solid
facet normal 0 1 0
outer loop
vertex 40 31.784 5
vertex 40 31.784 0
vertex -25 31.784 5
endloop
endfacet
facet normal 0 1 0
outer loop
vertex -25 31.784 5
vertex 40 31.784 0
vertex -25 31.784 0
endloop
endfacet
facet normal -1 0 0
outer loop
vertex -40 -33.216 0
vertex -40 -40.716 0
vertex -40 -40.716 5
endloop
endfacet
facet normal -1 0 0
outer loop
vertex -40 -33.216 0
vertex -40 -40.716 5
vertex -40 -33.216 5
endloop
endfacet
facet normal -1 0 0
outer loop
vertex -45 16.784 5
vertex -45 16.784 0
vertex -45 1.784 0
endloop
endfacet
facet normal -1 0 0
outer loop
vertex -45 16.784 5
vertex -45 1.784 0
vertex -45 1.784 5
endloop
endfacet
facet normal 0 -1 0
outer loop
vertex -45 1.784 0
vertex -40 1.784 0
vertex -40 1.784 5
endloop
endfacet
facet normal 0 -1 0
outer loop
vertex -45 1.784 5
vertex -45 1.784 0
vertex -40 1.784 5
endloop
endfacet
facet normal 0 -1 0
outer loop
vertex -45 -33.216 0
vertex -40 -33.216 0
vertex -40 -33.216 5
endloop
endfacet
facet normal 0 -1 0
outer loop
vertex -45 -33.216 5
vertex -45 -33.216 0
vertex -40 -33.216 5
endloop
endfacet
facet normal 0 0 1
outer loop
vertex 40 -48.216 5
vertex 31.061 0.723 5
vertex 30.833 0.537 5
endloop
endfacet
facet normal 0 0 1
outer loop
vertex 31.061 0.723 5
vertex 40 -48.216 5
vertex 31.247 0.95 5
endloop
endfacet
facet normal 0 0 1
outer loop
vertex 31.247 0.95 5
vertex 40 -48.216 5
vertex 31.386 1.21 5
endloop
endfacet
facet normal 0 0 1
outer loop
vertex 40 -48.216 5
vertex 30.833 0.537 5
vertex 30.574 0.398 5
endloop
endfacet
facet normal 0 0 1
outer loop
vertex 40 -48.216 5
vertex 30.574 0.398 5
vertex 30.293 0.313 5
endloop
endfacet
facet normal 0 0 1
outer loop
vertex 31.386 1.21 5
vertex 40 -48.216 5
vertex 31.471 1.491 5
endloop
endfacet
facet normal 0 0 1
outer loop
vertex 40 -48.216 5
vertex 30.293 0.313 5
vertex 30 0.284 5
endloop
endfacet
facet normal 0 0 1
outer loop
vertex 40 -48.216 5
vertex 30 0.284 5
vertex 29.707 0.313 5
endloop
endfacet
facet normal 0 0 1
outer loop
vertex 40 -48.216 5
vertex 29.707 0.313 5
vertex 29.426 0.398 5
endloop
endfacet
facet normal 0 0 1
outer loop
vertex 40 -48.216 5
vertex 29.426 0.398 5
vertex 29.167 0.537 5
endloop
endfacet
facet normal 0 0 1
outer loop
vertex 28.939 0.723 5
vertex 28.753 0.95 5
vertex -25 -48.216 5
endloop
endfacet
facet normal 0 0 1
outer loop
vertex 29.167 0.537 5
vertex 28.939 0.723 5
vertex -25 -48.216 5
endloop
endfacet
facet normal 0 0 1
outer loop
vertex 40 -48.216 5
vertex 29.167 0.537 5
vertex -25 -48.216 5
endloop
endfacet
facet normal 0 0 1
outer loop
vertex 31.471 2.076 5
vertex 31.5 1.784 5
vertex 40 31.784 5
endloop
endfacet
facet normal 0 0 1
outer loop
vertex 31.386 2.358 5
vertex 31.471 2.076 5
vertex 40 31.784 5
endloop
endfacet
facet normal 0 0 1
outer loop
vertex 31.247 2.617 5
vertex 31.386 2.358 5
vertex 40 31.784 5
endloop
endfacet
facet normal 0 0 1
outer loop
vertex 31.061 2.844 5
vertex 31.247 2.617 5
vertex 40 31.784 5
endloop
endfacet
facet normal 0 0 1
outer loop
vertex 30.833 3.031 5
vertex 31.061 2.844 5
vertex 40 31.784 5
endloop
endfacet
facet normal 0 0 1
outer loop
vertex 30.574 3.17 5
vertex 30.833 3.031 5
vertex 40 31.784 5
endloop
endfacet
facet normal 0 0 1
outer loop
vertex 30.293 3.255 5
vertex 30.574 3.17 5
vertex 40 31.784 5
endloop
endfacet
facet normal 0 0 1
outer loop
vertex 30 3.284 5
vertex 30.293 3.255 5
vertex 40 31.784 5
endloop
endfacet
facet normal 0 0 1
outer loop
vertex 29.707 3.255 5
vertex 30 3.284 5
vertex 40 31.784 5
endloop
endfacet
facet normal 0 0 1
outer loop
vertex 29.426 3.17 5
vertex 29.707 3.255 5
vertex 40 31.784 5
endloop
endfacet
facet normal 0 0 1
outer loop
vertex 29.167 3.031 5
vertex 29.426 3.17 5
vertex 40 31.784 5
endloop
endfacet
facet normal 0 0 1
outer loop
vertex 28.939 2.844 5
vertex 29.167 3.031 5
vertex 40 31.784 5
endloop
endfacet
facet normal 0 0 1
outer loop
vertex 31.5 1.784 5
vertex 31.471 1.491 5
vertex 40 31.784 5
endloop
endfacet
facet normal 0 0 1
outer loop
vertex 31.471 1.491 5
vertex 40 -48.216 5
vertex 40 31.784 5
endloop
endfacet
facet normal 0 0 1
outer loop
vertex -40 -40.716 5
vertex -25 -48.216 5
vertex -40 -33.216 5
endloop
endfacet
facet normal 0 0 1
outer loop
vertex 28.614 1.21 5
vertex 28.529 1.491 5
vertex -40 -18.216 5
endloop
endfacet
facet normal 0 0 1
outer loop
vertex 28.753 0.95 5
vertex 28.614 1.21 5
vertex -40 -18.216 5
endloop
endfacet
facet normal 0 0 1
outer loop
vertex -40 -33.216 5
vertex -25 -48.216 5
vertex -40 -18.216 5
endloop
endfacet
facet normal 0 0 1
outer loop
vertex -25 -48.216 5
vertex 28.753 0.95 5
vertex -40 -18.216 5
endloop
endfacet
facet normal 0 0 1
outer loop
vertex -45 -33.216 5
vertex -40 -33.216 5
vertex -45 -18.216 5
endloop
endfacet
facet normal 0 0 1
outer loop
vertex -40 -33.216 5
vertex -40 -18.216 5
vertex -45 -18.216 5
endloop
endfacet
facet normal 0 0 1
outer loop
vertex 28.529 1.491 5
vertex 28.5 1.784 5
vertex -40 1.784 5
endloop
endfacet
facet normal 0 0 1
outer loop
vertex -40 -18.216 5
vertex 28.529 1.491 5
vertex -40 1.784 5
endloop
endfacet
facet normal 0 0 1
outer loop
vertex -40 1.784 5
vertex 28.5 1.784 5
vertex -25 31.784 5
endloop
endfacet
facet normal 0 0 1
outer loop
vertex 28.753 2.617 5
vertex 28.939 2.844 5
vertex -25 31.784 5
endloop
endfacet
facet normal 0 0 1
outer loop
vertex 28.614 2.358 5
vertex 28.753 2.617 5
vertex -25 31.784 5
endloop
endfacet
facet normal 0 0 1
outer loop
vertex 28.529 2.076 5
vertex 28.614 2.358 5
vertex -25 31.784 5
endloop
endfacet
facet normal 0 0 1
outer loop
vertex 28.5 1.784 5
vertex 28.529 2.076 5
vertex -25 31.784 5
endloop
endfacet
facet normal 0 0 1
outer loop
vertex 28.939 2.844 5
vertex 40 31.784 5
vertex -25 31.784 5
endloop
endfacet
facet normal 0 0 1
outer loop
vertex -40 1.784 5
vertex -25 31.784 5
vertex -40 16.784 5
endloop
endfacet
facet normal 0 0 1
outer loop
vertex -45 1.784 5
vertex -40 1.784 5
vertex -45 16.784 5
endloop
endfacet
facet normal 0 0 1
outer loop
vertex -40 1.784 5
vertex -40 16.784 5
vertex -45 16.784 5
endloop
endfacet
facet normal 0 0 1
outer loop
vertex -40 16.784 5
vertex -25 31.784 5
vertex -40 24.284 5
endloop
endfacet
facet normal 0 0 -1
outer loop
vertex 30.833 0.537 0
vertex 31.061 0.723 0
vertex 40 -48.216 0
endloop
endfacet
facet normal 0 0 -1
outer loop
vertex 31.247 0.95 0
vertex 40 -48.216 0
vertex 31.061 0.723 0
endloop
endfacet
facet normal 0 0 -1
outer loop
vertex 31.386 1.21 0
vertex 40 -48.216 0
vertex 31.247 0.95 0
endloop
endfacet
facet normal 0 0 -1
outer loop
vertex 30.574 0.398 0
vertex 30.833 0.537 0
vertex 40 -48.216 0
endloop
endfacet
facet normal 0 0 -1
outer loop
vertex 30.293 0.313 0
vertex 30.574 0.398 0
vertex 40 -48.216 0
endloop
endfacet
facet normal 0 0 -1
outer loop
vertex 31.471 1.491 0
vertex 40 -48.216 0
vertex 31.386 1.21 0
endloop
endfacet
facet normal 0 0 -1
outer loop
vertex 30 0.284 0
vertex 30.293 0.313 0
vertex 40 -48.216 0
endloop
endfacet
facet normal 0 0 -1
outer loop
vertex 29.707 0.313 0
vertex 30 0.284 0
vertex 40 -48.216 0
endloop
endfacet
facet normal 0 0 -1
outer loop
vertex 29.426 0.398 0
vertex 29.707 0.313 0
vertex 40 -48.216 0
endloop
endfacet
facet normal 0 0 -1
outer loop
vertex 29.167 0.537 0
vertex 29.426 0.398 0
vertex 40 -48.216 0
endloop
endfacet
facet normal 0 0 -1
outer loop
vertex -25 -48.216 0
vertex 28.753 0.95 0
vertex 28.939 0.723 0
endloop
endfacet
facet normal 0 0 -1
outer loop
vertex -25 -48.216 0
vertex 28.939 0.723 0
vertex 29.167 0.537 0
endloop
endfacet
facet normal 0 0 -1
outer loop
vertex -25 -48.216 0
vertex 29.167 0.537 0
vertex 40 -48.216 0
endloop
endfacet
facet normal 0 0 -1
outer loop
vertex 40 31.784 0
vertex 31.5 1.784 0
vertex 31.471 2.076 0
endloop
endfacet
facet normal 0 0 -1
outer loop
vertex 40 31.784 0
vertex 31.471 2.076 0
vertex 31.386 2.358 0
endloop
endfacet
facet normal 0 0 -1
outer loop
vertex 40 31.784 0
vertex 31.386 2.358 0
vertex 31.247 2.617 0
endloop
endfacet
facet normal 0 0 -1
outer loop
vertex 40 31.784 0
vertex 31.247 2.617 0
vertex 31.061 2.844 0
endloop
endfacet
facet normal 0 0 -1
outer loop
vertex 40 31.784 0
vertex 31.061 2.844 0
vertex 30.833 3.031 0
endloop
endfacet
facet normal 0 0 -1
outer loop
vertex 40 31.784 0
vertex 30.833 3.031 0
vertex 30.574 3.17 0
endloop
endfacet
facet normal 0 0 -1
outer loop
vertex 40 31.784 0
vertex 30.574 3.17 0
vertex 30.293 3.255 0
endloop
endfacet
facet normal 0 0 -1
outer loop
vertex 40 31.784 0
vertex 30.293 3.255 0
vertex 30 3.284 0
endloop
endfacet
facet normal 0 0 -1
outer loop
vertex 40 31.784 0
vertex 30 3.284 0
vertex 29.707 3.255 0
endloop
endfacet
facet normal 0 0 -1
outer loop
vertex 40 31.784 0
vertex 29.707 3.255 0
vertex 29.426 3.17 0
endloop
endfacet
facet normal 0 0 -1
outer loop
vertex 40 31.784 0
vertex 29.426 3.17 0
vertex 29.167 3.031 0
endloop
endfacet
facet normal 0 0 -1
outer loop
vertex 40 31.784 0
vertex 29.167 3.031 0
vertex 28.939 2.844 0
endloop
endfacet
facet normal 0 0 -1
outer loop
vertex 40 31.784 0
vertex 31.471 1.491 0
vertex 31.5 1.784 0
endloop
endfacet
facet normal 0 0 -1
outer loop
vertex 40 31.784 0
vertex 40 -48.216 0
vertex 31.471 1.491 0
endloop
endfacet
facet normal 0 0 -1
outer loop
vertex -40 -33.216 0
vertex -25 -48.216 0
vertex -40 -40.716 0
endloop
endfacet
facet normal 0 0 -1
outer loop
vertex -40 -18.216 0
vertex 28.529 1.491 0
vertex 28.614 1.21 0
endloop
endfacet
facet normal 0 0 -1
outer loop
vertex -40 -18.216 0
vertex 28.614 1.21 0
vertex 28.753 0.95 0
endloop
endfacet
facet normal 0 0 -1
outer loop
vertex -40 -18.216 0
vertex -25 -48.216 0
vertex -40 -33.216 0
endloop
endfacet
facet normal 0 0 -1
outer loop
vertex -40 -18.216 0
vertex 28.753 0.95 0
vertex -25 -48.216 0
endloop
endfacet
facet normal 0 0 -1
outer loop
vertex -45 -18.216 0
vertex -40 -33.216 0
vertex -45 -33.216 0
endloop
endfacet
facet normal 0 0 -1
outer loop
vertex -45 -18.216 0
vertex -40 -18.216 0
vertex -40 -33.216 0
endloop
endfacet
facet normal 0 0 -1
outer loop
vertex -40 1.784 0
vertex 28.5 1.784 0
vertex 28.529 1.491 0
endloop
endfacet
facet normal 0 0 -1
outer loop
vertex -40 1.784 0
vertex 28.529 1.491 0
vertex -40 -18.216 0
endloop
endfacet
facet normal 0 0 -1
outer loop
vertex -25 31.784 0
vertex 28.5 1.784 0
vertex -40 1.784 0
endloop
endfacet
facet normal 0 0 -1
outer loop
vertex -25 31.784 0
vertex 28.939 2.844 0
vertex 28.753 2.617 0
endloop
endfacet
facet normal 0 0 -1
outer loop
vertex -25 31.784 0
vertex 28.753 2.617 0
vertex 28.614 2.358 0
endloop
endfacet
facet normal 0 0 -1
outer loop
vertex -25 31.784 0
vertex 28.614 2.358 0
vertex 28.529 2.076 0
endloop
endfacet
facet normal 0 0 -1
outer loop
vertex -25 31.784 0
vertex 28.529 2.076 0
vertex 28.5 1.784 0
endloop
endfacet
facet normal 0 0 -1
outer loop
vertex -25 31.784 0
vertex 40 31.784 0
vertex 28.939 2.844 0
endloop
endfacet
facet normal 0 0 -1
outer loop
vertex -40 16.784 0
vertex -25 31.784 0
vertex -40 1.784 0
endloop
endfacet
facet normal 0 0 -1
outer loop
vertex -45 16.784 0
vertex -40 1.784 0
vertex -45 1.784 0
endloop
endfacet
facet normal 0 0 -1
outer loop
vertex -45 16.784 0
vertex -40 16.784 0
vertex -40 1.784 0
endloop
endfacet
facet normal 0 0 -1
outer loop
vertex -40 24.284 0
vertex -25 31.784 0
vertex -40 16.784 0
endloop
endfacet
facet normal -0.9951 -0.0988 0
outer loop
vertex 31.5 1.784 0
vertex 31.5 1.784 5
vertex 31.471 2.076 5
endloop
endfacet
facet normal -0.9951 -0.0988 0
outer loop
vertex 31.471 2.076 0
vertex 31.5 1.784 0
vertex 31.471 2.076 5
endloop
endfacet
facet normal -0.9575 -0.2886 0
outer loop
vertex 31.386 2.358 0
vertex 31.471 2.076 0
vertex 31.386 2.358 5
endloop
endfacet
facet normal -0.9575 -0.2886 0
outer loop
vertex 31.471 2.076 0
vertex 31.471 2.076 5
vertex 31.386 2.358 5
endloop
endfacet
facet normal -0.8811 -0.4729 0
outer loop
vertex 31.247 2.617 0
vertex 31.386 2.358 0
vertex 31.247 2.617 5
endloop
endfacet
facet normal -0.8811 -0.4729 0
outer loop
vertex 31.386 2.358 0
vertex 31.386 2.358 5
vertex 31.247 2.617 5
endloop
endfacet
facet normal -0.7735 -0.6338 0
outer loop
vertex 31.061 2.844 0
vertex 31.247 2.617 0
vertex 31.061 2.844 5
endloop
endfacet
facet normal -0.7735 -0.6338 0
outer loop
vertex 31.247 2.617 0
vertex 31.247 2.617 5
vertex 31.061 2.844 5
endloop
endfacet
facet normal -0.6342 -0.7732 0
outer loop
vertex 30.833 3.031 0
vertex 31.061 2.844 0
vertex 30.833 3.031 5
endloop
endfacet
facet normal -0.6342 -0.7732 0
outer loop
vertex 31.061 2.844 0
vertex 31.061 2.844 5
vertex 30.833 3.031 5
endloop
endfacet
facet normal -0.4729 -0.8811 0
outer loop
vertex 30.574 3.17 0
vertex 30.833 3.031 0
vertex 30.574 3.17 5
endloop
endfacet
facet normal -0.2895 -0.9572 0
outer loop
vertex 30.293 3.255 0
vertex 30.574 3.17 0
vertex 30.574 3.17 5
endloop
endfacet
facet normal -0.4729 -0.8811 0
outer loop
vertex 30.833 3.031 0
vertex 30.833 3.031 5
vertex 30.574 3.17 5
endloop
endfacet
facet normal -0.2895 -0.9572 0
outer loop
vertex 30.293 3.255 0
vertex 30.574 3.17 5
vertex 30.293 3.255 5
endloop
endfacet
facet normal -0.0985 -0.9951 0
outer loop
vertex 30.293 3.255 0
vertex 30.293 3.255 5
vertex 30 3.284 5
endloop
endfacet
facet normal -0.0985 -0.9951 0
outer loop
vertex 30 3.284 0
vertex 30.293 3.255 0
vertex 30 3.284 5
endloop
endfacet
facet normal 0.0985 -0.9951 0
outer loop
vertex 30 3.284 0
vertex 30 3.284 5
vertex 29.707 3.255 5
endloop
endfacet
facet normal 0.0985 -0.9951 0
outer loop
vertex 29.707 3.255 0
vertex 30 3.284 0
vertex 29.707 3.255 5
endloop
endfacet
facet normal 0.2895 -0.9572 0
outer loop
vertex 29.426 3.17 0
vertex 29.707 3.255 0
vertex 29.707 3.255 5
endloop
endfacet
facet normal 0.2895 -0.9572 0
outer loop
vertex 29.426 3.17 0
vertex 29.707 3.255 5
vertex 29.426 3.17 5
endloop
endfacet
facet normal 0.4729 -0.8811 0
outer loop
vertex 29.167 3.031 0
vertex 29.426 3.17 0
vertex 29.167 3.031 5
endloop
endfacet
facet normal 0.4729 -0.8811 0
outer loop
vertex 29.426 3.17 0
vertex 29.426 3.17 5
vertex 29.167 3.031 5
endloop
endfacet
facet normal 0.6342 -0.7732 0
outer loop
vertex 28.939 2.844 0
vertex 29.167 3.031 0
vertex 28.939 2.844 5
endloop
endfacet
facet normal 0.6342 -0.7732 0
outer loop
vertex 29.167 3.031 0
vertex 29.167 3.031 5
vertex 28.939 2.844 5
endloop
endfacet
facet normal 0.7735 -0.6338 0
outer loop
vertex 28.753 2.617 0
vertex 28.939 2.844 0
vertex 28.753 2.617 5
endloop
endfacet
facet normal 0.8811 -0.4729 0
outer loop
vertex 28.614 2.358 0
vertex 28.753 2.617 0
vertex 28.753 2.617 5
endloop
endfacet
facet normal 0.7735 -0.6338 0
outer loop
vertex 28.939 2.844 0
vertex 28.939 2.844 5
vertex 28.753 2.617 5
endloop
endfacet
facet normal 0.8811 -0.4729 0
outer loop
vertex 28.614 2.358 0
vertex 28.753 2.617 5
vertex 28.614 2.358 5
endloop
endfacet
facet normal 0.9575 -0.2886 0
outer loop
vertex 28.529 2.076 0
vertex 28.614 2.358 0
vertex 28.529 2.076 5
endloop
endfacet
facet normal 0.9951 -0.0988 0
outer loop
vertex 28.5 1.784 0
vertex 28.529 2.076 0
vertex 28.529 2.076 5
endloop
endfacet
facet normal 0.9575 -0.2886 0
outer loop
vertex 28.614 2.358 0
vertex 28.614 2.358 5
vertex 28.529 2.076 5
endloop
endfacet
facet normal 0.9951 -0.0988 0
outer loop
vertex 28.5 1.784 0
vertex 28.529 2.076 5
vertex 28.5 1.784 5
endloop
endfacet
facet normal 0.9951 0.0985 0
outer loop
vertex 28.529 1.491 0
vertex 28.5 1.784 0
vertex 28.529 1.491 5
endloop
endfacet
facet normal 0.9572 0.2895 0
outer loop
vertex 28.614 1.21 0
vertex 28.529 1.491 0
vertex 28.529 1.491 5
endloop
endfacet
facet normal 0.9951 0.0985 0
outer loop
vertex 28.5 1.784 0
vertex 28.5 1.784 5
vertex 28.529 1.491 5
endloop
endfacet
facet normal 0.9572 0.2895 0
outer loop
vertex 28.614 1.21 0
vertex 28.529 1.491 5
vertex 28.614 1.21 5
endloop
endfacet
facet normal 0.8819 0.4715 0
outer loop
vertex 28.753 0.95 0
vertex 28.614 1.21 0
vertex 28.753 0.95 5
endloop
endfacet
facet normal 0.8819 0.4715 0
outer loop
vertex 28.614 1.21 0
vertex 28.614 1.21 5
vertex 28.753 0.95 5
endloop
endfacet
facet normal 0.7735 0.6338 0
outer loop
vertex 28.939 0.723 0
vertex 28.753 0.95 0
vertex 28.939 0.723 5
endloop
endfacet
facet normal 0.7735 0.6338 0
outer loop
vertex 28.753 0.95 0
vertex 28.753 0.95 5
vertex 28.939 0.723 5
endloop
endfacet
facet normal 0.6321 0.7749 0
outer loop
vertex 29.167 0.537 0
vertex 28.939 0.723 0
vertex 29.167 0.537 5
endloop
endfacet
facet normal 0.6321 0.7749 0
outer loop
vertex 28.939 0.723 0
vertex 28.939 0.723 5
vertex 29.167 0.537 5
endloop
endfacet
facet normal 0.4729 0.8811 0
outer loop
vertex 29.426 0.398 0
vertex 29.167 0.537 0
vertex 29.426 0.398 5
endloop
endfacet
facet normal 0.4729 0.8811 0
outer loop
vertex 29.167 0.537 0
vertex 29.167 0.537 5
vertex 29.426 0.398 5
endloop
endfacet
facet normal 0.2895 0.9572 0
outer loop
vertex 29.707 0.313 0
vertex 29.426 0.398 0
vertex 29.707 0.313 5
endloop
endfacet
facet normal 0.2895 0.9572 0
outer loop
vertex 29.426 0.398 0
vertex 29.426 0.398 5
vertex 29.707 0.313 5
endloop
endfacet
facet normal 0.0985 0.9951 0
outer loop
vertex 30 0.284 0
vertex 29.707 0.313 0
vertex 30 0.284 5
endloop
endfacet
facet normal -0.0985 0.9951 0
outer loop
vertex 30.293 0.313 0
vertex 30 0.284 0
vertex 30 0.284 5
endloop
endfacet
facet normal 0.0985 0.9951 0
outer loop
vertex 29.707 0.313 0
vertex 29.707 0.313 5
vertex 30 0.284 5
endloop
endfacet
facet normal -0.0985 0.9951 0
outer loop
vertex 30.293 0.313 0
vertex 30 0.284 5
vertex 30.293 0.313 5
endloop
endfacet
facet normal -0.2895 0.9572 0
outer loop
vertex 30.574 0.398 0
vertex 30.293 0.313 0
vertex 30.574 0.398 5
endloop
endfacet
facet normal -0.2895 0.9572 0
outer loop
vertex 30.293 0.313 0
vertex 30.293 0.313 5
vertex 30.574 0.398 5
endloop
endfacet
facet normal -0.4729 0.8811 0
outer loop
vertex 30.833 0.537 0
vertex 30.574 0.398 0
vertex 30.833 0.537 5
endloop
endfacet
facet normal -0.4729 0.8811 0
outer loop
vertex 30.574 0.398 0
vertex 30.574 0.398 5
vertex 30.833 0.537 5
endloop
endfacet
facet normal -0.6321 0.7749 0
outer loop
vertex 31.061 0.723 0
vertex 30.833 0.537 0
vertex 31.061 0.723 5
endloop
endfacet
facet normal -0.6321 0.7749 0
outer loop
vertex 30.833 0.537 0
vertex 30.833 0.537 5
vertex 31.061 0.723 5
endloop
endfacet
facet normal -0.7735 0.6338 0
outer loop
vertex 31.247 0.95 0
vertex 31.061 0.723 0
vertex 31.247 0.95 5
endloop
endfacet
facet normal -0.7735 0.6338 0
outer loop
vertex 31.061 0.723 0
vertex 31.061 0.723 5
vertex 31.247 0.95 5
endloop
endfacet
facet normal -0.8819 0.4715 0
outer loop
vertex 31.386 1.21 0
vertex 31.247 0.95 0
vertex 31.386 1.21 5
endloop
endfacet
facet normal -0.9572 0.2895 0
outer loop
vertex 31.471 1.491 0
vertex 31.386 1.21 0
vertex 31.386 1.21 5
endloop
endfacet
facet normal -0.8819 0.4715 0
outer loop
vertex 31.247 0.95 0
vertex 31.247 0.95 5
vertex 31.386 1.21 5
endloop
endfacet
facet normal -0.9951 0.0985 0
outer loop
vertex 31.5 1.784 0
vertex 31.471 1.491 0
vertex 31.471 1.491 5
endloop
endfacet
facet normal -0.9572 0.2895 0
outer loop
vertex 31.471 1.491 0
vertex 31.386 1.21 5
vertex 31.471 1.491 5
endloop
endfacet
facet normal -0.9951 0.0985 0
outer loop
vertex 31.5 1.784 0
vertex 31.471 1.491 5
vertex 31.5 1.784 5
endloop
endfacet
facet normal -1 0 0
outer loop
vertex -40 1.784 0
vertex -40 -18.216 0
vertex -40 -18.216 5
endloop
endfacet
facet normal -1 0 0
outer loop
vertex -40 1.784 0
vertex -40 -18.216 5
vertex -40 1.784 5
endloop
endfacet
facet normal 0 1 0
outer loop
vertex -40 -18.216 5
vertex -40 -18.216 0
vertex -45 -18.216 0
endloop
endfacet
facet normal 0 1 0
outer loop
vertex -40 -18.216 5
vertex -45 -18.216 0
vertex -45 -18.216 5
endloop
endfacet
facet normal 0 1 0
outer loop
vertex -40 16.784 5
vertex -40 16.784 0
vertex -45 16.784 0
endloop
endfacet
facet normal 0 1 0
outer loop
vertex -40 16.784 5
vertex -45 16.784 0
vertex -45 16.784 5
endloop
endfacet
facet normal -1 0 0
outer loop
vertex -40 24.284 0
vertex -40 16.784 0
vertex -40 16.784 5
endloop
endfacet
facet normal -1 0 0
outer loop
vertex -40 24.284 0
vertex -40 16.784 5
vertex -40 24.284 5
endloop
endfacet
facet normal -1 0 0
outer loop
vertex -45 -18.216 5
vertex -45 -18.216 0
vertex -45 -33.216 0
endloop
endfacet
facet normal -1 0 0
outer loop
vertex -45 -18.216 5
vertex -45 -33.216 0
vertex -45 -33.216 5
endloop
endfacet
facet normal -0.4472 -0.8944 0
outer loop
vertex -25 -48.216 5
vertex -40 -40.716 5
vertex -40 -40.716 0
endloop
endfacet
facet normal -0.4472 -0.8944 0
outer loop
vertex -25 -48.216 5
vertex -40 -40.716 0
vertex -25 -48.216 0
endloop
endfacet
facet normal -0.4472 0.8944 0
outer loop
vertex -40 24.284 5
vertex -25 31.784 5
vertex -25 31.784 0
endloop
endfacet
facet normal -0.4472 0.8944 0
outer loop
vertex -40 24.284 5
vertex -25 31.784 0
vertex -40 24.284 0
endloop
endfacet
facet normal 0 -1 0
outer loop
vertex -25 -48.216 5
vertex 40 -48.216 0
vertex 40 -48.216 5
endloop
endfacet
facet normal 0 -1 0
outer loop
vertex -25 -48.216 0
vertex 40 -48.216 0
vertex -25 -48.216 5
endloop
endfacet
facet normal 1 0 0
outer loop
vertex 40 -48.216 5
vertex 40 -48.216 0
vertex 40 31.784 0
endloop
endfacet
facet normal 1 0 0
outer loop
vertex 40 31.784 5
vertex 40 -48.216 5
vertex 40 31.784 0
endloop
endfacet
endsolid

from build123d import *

# Parameters (mm, degrees)
BOSS_EXTRUDE1_DEPTH = 5
SKETCH3_W           = 5
SKETCH3_H           = 15
BOSS_EXTRUDE2_DEPTH = 5
CUT_EXTRUDE2_DEPTH  = 5
SKETCH5_R           = 1.5
CUT_EXTRUDE3_DEPTH  = 5


with BuildPart() as part:
    # Sketch1 → Boss-Extrude1 (new body)
    with BuildSketch(Plane.XY):
        Polygon((0, 31.783783784), (10, 31.783783784), (40, 31.783783784), (40, 21.783783784), (40, -48.216216216), (-40, -48.216216216), (-40, 31.783783784), align=None)
    extrude(amount=BOSS_EXTRUDE1_DEPTH)

    # Sketch3 → Boss-Extrude2 (add)
    with BuildSketch(Plane.ZY.offset(40)):
        with Locations((2.5, 9.283783784)):
            Rectangle(SKETCH3_W, SKETCH3_H)
        with Locations((2.5, -25.716216216)):
            Rectangle(SKETCH3_W, SKETCH3_H)
    extrude(amount=BOSS_EXTRUDE2_DEPTH)

    # Sketch4 → Cut-Extrude2 (cut)
    with BuildSketch(Plane.XY.offset(5)):
        Polygon((-40, 31.783783784), (-25, 31.783783784), (-40, 24.283783784), align=None)
        Polygon((-40, -48.216216216), (-40, -40.716216216), (-25, -48.216216216), align=None)
    extrude(amount=-CUT_EXTRUDE2_DEPTH, mode=Mode.SUBTRACT)

    # Sketch5 → Cut-Extrude3 (cut)
    with BuildSketch(Plane.XY.offset(5)):
        with Locations((30, 1.783783784)):
            Circle(SKETCH5_R)
    extrude(amount=-CUT_EXTRUDE3_DEPTH, mode=Mode.SUBTRACT)


solid = part.part
